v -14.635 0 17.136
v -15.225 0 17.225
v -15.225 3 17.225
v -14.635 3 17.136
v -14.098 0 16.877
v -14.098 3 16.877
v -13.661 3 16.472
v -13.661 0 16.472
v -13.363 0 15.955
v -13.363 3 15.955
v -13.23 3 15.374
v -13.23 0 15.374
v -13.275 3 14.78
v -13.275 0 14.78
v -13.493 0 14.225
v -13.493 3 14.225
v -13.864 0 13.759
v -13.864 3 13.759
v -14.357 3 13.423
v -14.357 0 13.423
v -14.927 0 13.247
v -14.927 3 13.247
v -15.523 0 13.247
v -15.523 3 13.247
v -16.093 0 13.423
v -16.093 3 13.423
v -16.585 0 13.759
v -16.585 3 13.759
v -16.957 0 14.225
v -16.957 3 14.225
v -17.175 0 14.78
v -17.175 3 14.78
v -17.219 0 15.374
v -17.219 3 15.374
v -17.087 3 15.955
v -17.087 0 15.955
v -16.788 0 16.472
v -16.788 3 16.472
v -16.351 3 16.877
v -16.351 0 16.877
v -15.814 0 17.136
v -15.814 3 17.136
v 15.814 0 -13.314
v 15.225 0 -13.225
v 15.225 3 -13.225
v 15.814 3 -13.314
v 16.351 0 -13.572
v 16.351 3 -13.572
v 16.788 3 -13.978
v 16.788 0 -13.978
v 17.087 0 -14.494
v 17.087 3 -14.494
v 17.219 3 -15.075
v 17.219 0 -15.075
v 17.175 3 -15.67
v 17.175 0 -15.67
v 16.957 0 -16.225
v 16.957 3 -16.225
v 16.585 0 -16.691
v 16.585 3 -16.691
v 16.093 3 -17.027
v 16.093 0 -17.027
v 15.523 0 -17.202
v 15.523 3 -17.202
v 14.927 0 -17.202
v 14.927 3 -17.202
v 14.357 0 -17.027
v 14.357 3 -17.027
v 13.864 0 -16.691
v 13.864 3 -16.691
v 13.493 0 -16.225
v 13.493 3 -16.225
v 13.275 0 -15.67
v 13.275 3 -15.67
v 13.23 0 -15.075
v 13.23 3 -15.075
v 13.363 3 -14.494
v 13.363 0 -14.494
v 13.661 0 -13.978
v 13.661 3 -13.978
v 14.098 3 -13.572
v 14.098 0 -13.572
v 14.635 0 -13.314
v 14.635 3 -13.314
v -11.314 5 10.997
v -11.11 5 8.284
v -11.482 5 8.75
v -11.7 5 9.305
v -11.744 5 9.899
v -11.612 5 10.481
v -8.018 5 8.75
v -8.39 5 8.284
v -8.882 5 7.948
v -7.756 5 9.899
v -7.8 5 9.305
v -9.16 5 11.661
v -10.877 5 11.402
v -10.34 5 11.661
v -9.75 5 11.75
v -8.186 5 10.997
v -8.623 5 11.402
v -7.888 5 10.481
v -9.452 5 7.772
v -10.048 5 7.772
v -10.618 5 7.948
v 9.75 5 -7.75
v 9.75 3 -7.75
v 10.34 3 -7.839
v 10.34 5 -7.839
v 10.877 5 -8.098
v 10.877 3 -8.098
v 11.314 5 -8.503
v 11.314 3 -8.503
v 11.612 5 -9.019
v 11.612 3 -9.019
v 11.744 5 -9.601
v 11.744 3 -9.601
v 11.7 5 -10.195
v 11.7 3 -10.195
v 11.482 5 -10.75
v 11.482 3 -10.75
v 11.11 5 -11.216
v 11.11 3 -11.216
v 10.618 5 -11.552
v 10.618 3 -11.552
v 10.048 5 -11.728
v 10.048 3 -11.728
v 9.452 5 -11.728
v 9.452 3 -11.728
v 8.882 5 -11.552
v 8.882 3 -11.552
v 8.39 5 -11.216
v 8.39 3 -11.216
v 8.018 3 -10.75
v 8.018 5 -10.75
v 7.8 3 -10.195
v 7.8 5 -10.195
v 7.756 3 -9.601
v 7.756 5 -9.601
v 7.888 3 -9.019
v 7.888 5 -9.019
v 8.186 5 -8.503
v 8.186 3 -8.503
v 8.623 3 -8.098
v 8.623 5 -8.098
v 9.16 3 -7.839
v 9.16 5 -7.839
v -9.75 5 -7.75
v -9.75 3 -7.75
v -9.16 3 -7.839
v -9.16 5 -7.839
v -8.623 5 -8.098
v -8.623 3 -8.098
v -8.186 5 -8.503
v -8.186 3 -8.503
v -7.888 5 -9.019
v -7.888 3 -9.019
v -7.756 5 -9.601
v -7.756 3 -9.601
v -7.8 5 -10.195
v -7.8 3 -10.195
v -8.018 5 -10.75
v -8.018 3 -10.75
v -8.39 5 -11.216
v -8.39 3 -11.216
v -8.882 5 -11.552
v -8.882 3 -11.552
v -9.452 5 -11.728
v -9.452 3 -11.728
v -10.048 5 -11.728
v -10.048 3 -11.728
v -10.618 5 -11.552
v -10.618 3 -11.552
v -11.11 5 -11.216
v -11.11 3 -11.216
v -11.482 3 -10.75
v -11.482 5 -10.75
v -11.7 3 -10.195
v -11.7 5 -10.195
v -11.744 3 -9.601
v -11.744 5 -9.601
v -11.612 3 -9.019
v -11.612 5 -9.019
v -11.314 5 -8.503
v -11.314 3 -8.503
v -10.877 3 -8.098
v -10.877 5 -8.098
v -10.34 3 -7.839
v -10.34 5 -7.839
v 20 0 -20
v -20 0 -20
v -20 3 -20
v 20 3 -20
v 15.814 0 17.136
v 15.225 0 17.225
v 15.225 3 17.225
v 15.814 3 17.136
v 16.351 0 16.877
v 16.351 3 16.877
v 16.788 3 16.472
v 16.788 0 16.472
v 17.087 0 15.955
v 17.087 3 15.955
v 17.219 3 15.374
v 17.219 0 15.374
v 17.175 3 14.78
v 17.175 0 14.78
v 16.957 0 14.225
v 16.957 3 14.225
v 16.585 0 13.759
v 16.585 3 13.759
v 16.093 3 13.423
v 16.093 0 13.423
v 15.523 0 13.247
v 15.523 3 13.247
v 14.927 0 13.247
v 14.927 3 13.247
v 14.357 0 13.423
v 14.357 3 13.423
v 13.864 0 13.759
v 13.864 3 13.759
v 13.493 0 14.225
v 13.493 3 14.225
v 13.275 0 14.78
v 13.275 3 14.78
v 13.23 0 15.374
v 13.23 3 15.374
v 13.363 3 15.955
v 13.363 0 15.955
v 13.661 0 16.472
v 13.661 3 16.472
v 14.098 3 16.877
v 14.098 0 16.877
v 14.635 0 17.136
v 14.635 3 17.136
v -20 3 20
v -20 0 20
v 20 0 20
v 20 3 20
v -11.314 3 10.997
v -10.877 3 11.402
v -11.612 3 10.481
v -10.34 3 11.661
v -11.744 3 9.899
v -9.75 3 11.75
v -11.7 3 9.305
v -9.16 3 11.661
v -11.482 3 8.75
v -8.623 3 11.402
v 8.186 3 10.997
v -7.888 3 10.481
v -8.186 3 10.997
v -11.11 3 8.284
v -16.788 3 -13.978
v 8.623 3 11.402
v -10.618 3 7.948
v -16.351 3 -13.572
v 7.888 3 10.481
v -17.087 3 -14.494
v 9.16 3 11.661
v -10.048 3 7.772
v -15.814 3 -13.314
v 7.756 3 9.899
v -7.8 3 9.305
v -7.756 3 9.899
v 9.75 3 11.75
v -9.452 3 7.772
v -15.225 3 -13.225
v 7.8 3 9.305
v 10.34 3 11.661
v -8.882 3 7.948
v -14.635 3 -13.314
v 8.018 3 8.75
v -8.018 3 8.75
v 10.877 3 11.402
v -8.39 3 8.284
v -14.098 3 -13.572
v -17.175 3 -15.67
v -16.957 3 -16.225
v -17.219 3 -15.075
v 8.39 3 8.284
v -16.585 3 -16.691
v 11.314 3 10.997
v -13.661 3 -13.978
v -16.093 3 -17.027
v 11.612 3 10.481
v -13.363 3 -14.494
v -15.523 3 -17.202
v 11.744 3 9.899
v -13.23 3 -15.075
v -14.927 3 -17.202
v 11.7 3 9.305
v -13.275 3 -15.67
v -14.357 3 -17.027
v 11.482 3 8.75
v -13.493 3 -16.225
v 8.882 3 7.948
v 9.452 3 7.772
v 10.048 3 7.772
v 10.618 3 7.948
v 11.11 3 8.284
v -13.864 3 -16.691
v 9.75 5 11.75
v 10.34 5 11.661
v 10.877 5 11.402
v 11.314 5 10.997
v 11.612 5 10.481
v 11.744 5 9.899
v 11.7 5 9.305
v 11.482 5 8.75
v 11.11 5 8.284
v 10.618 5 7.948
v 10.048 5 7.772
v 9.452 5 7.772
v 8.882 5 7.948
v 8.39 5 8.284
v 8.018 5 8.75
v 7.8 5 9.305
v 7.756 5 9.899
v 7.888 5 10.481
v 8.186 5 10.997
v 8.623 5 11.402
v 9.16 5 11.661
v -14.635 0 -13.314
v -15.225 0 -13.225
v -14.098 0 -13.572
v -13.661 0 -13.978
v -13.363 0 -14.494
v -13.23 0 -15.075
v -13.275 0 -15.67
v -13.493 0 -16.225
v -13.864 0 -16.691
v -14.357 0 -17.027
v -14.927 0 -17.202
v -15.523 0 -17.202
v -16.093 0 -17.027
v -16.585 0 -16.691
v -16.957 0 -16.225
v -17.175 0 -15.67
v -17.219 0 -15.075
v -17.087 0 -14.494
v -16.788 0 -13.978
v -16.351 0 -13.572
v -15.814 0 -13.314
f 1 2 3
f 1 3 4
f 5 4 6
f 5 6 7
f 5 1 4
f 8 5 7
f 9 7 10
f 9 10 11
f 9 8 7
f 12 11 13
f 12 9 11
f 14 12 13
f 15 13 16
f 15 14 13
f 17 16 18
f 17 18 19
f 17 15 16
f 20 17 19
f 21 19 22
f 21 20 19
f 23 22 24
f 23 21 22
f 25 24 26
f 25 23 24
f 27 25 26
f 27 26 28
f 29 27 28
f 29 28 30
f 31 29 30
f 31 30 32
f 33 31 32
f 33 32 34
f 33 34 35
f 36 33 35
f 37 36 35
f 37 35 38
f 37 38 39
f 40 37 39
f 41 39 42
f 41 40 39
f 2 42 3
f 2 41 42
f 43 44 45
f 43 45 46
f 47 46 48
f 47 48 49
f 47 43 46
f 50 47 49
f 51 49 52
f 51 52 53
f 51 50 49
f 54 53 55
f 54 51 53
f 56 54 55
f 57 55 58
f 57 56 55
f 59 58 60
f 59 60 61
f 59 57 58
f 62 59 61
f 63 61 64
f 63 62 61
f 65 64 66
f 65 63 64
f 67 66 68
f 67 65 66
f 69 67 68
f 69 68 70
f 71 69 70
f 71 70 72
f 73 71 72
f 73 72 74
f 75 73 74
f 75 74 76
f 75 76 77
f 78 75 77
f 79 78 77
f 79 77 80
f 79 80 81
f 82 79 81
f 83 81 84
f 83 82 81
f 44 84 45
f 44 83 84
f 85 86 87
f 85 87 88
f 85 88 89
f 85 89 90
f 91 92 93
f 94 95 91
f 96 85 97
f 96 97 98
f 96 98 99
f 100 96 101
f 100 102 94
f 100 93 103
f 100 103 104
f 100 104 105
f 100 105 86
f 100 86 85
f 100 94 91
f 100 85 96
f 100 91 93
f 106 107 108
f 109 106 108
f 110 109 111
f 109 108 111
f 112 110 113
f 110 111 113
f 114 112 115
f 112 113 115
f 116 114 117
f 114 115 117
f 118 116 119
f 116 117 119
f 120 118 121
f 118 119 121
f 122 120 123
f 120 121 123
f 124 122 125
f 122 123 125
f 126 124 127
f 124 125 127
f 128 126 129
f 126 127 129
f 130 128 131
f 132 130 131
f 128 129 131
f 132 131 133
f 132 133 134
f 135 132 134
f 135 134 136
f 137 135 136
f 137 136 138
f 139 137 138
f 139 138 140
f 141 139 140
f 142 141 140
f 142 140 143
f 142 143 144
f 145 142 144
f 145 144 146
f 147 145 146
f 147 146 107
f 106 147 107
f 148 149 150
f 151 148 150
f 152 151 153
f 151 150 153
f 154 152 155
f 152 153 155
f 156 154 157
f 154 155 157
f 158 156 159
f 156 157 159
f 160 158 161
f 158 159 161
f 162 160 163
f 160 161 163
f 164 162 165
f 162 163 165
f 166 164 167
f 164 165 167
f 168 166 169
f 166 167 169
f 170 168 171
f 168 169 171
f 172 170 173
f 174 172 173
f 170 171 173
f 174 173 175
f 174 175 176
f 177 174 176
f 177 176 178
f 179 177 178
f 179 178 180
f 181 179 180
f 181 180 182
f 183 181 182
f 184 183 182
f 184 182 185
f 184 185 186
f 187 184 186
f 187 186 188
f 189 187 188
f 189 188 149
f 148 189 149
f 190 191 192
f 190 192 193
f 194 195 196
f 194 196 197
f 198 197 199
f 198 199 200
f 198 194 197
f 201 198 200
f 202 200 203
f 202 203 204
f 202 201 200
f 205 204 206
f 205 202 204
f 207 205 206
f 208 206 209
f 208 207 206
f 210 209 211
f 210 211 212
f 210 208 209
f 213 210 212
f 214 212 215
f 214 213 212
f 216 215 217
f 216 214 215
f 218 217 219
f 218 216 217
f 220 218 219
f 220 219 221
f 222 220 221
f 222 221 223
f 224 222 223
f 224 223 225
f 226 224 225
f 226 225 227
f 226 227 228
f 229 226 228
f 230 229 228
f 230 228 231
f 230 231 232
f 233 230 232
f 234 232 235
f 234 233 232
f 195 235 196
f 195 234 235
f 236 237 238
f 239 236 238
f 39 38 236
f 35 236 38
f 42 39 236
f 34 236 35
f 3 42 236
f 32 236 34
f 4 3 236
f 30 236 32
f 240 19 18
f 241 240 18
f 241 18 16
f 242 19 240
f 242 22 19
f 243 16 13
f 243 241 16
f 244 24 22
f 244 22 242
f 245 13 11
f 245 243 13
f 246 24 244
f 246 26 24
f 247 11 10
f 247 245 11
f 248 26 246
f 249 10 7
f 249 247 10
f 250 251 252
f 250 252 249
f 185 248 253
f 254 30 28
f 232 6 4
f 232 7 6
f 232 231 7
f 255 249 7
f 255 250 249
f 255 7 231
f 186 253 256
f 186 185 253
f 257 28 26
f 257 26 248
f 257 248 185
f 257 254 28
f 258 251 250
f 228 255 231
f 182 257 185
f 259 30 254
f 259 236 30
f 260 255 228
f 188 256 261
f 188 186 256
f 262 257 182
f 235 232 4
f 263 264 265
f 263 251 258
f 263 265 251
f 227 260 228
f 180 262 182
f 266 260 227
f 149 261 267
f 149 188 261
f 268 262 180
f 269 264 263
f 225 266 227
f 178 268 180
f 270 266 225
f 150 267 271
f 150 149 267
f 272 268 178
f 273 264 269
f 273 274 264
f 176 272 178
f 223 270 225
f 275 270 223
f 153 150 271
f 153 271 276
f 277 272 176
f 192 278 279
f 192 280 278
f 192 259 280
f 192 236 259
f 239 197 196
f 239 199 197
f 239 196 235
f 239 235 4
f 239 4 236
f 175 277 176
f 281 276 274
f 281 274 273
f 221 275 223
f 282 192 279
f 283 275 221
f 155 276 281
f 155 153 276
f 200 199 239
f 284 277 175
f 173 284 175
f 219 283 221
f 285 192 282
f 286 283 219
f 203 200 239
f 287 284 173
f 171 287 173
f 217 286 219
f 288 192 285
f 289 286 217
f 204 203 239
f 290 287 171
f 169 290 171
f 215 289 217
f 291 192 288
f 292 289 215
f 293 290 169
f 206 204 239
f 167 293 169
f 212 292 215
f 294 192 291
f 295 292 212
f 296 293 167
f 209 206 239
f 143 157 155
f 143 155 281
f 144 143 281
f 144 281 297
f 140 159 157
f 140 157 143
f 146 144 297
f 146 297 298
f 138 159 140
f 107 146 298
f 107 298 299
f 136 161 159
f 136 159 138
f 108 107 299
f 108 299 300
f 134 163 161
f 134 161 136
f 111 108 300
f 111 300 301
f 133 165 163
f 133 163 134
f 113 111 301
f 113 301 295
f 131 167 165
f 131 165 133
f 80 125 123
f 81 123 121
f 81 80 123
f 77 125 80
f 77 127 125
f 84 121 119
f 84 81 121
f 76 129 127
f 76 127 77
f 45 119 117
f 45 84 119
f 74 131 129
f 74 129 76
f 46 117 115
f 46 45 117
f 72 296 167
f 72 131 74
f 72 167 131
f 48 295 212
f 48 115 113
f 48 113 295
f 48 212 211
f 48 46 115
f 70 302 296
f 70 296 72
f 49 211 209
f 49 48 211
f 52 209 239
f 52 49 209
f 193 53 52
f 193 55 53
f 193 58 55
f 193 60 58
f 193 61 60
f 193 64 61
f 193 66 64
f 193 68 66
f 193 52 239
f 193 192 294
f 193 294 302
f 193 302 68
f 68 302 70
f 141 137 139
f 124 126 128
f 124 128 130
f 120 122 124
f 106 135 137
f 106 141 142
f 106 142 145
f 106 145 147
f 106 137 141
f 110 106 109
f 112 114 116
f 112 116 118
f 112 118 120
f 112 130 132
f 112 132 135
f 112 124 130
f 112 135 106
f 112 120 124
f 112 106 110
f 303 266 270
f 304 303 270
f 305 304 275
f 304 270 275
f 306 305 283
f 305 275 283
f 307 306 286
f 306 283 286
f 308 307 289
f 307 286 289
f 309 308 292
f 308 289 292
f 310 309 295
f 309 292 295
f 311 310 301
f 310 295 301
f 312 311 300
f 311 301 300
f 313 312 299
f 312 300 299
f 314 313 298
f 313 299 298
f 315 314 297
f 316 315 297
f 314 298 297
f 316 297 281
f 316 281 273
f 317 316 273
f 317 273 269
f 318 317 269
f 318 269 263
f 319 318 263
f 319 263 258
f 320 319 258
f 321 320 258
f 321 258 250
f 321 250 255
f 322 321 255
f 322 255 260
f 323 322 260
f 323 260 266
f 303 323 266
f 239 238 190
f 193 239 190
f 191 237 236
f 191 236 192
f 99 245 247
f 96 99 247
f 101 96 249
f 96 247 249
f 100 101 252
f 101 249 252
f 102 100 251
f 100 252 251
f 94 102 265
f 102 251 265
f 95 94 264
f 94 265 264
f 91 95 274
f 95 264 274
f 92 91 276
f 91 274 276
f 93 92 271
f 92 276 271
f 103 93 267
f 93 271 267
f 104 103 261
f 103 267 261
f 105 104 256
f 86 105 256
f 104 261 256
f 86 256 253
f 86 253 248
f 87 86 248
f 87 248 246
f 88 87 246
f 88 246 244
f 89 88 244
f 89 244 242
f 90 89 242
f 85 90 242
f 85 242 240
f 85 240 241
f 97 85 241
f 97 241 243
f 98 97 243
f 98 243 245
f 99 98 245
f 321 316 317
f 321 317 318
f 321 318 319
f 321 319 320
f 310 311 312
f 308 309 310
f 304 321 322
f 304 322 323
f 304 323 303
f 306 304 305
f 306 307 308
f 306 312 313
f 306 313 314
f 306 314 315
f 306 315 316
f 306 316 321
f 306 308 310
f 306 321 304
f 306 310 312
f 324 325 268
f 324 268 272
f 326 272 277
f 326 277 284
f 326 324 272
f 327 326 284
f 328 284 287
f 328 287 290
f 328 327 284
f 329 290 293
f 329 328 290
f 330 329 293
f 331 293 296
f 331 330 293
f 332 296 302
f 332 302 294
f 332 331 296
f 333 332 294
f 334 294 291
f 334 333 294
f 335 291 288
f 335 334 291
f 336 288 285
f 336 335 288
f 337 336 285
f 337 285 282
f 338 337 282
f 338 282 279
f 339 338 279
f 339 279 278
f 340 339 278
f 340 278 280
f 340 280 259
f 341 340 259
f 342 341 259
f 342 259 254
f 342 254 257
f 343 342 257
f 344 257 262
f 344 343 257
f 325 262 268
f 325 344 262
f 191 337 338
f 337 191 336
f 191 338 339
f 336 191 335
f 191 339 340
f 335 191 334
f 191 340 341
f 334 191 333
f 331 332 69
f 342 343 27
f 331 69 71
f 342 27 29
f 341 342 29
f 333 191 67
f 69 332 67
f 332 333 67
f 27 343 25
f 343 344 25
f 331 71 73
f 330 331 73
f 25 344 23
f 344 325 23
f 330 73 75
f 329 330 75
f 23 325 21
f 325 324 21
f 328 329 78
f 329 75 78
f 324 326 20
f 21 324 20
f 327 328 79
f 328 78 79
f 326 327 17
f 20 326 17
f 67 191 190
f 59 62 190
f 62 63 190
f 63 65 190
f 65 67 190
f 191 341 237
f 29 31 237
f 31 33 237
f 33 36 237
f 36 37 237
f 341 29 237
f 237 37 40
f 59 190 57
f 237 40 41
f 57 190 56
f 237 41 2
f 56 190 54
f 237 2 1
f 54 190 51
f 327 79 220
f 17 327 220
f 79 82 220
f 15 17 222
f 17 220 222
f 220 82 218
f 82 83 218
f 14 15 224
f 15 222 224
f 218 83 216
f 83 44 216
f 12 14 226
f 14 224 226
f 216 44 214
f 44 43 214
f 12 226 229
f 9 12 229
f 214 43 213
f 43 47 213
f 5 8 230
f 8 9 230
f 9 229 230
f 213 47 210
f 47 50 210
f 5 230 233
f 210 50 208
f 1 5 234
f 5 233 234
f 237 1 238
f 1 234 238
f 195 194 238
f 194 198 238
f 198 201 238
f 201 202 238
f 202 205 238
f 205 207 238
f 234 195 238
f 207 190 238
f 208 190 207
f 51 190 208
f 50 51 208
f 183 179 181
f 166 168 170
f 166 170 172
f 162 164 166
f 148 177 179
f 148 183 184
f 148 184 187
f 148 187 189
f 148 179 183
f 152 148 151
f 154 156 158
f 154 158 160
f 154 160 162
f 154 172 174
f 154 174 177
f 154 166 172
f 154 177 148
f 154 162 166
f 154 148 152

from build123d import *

# Parameters (mm, degrees)
SKETCH_2_W          = 40
SKETCH_2_H          = 40
EXTRUDE_2_DEPTH     = 3
SKETCH_3_R          = 2
CUT_EXTRUDE_1_DEPTH = 3
SKETCH_2_6_R        = 2
EXTRUDE_3_DEPTH     = 5


with BuildPart() as part:
    # 草图2 → 凸台-拉伸2 (new body)
    with BuildSketch(Plane(origin=(0, 0, 0), x_dir=(1, 0, 0), z_dir=(0, 1, 0))):
        Rectangle(SKETCH_2_W, SKETCH_2_H)
    extrude(amount=EXTRUDE_2_DEPTH)

    # 草图3 → 切除-拉伸1 (cut)
    with BuildSketch(Plane(origin=(0, 0, 0), x_dir=(1, 0, 0), z_dir=(0, 1, 0))):
        with Locations((-15.224798987, -15.224798987)):
            Circle(SKETCH_3_R)
        with Locations((15.224798987, -15.224798987)):
            Circle(SKETCH_3_R)
        with Locations((15.224798987, 15.224798987)):
            Circle(SKETCH_3_R)
        with Locations((-15.224798987, 15.224798987)):
            Circle(SKETCH_3_R)
    extrude(amount=CUT_EXTRUDE_1_DEPTH, mode=Mode.SUBTRACT)

    # 草图2<6> → 凸台-拉伸3 (add)
    with BuildSketch(Plane(origin=(0, 0, 0), x_dir=(1, 0, 0), z_dir=(0, 1, 0))):
        with Locations((9.75, 9.75)):
            Circle(SKETCH_2_6_R)
        with Locations((-9.75, 9.75)):
            Circle(SKETCH_2_6_R)
        with Locations((9.75, -9.75)):
            Circle(SKETCH_2_6_R)
        with Locations((-9.75, -9.75)):
            Circle(SKETCH_2_6_R)
    extrude(amount=EXTRUDE_3_DEPTH)


solid = part.part
